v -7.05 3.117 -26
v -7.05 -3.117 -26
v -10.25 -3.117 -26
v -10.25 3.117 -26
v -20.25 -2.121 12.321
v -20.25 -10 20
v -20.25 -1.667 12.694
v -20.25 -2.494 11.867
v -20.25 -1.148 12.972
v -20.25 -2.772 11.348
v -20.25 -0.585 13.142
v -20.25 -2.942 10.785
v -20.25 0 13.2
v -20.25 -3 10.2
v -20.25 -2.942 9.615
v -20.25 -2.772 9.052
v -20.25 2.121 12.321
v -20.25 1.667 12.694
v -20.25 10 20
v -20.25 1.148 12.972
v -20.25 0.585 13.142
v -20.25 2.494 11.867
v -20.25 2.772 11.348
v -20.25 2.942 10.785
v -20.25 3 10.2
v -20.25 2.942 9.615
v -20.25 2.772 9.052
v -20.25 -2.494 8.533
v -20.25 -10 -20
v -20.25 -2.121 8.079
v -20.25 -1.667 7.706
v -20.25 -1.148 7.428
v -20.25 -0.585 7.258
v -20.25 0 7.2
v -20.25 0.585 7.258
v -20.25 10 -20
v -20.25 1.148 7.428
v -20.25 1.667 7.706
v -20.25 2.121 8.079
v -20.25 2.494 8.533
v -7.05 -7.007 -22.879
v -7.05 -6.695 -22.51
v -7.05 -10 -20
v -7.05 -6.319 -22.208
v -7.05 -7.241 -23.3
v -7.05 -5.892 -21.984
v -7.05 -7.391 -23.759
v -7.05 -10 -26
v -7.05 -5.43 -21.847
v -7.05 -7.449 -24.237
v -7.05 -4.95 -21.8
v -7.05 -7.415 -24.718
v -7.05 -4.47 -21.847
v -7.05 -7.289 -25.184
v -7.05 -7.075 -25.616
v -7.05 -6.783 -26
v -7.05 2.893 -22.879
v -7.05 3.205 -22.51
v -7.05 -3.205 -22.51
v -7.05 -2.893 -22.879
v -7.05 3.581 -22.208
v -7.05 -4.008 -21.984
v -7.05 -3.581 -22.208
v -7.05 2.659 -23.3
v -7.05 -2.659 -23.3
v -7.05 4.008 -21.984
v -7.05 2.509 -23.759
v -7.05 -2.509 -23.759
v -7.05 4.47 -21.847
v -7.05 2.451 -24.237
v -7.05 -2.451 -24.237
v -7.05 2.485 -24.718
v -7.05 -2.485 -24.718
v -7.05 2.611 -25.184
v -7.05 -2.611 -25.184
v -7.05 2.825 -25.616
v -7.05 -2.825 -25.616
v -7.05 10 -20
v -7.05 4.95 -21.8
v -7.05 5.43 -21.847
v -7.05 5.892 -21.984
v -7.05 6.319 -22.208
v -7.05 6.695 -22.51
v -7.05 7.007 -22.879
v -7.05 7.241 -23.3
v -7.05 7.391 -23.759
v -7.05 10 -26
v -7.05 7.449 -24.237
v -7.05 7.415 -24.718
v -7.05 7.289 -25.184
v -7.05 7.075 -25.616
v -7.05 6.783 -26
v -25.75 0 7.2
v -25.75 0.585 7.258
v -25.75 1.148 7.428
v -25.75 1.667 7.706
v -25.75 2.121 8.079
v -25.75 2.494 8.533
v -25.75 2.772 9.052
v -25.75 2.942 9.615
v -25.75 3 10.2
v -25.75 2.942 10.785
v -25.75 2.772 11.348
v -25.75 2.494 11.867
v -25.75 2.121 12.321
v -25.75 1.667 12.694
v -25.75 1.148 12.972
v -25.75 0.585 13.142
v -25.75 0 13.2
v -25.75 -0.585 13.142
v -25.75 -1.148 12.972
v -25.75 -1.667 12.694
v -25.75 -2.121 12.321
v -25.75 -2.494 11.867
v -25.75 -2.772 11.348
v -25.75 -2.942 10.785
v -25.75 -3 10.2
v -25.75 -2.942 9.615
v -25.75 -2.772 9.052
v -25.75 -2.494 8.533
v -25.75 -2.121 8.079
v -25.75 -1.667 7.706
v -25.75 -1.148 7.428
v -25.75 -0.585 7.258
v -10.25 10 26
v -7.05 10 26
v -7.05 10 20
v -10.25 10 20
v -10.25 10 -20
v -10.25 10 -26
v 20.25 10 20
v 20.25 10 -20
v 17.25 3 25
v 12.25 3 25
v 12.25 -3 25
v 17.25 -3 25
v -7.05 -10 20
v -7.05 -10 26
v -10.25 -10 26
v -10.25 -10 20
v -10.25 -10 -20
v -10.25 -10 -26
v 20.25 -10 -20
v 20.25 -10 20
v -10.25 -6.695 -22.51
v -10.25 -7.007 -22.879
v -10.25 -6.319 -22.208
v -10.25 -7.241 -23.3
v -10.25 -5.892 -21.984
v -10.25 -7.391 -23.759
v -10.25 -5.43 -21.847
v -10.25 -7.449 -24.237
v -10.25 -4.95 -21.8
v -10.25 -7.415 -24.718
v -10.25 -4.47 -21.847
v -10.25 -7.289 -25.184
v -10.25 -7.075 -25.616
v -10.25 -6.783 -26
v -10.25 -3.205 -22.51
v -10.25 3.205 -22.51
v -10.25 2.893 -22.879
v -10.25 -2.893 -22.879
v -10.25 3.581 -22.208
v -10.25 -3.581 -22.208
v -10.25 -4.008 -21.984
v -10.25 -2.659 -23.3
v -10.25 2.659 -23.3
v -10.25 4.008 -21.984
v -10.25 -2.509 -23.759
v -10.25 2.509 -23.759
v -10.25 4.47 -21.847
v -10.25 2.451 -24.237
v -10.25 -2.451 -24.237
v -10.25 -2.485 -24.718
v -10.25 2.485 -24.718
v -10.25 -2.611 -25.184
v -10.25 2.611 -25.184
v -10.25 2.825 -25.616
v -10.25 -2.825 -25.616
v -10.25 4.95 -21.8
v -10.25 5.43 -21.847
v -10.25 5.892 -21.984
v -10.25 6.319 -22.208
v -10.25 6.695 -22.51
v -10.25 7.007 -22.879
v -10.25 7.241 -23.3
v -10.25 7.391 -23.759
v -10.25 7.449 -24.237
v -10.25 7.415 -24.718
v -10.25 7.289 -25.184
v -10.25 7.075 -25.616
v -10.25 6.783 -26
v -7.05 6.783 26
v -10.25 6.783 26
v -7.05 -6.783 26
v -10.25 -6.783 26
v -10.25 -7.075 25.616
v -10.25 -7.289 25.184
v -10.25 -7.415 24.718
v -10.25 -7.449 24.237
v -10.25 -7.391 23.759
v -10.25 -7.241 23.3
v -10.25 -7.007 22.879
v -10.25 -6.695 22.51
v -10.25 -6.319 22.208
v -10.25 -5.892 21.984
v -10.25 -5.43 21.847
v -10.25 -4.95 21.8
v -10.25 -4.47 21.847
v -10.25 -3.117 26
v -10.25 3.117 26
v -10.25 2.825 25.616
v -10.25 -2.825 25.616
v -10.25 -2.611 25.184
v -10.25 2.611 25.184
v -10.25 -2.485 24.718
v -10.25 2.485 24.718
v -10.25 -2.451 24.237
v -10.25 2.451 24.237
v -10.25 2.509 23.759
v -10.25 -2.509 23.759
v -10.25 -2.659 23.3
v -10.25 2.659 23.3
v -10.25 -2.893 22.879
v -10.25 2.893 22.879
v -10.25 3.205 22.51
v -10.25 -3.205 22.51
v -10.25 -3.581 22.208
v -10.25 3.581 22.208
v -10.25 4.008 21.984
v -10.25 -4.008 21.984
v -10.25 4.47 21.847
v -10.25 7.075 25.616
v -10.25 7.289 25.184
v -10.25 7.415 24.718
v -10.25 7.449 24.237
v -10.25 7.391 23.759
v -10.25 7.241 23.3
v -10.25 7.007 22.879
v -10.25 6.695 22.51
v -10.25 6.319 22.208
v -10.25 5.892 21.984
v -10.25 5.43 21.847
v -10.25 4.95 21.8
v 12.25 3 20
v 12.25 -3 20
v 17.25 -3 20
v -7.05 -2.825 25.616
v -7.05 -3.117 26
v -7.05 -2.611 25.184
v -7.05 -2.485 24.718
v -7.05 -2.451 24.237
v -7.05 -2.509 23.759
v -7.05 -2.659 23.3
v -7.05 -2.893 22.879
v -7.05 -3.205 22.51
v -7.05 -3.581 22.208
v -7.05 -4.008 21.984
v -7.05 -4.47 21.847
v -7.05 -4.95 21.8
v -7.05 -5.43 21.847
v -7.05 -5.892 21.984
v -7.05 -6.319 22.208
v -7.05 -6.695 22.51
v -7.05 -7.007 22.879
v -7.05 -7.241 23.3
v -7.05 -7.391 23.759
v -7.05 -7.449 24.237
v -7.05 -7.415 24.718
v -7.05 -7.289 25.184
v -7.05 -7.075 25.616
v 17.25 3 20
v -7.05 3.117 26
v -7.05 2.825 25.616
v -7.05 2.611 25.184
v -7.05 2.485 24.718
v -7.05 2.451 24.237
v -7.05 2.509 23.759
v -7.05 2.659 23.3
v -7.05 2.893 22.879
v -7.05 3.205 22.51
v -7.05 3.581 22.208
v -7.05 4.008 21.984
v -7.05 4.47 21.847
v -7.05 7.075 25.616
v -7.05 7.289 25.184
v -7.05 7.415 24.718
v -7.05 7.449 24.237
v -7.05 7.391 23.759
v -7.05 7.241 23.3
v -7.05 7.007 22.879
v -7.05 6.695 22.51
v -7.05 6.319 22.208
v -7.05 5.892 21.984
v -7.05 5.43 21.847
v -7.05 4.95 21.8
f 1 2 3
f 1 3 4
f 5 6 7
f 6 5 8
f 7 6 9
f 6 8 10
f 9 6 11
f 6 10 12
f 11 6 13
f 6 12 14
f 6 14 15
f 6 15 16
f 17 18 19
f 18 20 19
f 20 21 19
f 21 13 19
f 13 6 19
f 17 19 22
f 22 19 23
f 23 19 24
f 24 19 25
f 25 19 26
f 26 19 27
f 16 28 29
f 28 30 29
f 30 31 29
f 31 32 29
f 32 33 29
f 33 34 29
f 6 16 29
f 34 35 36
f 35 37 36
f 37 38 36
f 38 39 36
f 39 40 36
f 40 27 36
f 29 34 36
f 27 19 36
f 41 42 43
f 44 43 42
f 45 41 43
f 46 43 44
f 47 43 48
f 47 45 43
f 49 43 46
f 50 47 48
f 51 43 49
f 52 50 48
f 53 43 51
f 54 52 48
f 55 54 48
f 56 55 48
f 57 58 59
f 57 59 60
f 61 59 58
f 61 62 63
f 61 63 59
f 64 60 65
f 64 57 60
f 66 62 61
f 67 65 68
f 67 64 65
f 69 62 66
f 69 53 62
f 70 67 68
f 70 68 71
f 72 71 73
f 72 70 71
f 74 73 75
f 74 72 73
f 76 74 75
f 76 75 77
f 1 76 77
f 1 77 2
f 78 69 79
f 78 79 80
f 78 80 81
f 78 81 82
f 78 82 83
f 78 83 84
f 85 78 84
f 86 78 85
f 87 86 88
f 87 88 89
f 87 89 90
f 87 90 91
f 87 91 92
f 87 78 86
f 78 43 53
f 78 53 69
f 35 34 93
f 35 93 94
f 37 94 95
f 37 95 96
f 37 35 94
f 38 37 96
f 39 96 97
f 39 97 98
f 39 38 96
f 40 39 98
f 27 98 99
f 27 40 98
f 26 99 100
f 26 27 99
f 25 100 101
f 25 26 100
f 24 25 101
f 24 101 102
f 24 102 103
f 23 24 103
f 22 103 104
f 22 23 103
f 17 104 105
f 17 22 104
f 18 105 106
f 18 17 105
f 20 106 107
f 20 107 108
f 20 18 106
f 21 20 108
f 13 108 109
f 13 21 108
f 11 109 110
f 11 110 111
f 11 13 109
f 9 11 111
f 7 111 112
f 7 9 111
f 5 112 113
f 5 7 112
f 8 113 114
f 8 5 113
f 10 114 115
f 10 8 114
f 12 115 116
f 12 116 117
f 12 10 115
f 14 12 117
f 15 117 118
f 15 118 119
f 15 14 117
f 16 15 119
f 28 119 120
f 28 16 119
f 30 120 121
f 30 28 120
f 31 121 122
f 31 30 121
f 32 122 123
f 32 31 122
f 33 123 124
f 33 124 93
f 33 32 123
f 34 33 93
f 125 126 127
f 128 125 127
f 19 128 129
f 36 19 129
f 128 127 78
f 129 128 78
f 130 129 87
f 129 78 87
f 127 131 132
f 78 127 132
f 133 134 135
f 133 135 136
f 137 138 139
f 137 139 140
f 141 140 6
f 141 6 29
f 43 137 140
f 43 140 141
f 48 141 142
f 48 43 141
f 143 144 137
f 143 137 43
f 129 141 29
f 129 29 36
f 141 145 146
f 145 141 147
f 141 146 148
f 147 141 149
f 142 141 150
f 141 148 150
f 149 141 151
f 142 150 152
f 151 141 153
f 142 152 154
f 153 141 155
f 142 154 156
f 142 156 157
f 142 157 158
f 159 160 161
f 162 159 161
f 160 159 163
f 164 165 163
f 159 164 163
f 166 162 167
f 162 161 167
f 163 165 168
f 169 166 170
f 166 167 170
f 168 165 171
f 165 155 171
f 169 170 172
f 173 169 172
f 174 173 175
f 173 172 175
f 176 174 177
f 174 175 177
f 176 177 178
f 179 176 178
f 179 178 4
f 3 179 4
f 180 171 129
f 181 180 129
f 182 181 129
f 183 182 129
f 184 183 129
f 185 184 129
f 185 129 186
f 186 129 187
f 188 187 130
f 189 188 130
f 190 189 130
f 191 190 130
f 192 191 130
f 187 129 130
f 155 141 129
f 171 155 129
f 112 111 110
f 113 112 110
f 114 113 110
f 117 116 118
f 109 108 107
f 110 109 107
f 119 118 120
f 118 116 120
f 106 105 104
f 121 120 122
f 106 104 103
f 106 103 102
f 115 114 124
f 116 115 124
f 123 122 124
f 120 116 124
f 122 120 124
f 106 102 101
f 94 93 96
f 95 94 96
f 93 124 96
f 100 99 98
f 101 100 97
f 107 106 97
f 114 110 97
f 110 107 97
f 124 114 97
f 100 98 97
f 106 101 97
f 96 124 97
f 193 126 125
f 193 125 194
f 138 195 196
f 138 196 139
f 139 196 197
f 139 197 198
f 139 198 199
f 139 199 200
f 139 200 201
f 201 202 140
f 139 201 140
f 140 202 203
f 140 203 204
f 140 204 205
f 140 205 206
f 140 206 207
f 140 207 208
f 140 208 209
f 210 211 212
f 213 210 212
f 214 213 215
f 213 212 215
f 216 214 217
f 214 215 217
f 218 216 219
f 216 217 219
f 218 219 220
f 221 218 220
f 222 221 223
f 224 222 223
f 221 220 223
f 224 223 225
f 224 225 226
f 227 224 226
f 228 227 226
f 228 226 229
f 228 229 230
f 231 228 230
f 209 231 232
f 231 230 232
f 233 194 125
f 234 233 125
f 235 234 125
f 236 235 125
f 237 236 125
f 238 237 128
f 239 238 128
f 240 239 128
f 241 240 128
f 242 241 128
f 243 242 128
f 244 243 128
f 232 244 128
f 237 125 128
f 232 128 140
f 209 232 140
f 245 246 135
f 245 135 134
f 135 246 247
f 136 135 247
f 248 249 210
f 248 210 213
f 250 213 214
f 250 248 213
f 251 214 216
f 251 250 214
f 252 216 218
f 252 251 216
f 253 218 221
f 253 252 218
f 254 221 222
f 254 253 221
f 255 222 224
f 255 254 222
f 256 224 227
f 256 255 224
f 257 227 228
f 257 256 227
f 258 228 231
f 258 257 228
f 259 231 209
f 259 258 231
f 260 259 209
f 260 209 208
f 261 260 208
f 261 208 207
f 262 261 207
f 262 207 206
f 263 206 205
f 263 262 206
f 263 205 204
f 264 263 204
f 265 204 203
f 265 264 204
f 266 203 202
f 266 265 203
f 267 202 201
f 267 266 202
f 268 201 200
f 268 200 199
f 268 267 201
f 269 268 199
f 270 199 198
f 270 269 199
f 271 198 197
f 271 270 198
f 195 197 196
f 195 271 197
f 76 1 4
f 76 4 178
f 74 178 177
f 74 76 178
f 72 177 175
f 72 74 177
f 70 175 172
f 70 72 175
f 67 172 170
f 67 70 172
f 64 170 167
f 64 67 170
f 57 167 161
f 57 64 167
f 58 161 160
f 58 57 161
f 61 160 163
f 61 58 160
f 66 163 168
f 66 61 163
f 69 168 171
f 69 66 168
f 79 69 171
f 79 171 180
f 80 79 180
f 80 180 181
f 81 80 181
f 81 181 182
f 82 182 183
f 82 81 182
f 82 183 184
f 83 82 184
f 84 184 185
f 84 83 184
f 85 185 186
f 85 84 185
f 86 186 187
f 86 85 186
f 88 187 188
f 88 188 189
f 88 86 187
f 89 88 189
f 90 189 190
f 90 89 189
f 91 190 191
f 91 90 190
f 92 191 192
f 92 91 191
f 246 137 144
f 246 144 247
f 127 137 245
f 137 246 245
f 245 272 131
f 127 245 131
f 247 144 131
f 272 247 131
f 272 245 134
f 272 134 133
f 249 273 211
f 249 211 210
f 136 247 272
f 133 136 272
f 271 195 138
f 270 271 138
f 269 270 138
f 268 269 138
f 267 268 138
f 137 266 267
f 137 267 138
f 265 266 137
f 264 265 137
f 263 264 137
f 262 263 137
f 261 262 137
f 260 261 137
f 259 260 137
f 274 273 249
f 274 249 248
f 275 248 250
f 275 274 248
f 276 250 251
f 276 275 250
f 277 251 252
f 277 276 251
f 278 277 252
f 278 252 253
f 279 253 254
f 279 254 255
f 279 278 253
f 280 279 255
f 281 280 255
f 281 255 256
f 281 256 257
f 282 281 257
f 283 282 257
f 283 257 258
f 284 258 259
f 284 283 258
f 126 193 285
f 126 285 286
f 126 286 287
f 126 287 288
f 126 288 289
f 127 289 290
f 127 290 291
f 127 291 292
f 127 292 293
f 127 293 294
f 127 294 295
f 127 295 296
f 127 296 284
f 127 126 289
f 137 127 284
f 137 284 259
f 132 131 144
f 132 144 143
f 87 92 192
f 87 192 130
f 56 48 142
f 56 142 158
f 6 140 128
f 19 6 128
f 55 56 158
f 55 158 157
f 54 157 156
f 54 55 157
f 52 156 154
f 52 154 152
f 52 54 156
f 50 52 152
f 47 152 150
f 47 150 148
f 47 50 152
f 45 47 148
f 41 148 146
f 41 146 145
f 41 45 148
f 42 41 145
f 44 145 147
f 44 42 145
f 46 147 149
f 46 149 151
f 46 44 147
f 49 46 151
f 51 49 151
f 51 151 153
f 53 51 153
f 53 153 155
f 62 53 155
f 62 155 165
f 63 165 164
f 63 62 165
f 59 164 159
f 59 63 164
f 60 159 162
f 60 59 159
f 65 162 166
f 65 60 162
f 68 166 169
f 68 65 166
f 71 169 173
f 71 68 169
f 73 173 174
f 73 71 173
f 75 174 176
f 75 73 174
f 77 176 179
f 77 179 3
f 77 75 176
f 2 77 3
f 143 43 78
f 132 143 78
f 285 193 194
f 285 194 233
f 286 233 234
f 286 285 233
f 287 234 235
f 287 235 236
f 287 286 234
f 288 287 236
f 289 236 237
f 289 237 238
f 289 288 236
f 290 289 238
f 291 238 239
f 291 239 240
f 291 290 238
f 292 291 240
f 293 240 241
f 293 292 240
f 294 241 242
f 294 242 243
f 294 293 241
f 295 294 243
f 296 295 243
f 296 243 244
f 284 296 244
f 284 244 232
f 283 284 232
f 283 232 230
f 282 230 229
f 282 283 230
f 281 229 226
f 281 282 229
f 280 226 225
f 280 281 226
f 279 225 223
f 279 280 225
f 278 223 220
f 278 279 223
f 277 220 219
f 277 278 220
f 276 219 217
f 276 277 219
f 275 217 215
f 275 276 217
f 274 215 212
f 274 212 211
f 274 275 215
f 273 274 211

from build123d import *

# Parameters (mm, degrees)
BOSS_EXTRUDE1_START = 20.25
SKETCH2_W           = 40
SKETCH2_H           = 20
SKETCH2_R           = 3
BOSS_EXTRUDE1_DEPTH = 40.5
BOSS_EXTRUDE2_START = -7.05
BOSS_EXTRUDE2_DEPTH = 3.2
BOSS_EXTRUDE3_START = -20.25
SKETCH2_5_R         = 3
BOSS_EXTRUDE3_DEPTH = 5.5
SKETCH3_W           = 5
SKETCH3_H           = 6
BOSS_EXTRUDE4_DEPTH = 5


with BuildPart() as part:
    # Sketch2 → Boss-Extrude1 (new body)
    # profile 1 of 2: a face of its own
    with BuildSketch(Plane(origin=(0, 0, 0), x_dir=(0, 0, -1), z_dir=(1, 0, 0)).offset(BOSS_EXTRUDE1_START)):
        Rectangle(SKETCH2_W, SKETCH2_H)
        with Locations((-10.2, 0)):
            Circle(SKETCH2_R, mode=Mode.SUBTRACT)
    # profile 2 of 2: a face of its own
    with BuildSketch(Plane(origin=(0, 0, 0), x_dir=(0, 0, -1), z_dir=(1, 0, 0)).offset(BOSS_EXTRUDE1_START)):
        with Locations((-10.2, 0)):
            Circle(SKETCH2_R)
    extrude(amount=-BOSS_EXTRUDE1_DEPTH)

    # Sketch2<3> → Boss-Extrude2 (add)
    with BuildSketch(Plane(origin=(0, 0, 0), x_dir=(0, 0, -1), z_dir=(1, 0, 0)).offset(BOSS_EXTRUDE2_START)):
        with BuildLine():
            Line((-26, -10), (-20, -10))
            Line((-20, -10), (-20, 10))
            Line((-20, 10), (-26, 10))
            Line((-26, 10), (-26, 6.783030278))
            ThreePointArc((-26, 6.783030278), (-21.8, 4.95), (-26, 3.116969722))
            Line((-26, 3.116969722), (-26, -3.116969722))
            ThreePointArc((-26, -3.116969722), (-21.8, -4.95), (-26, -6.783030278))
            Line((-26, -6.783030278), (-26, -10))
        make_face()
        with BuildLine():
            Line((20, 10), (20, -10))
            Line((20, -10), (26, -10))
            Line((26, -10), (26, -6.783030278))
            ThreePointArc((26, -6.783030278), (21.8, -4.95), (26, -3.116969722))
            Line((26, -3.116969722), (26, 3.116969722))
            ThreePointArc((26, 3.116969722), (21.8, 4.95), (26, 6.783030278))
            Line((26, 6.783030278), (26, 10))
            Line((26, 10), (20, 10))
        make_face()
    extrude(amount=-BOSS_EXTRUDE2_DEPTH)

    # Sketch2<5> → Boss-Extrude3 (add)
    with BuildSketch(Plane(origin=(0, 0, 0), x_dir=(0, 0, -1), z_dir=(1, 0, 0)).offset(BOSS_EXTRUDE3_START)):
        with Locations((-10.2, 0)):
            Circle(SKETCH2_5_R)
    extrude(amount=-BOSS_EXTRUDE3_DEPTH)

    # Sketch3 → Boss-Extrude4 (add)
    with BuildSketch(Plane.XY.offset(20)):
        with Locations((14.75, 0)):
            Rectangle(SKETCH3_W, SKETCH3_H)
    extrude(amount=BOSS_EXTRUDE4_DEPTH)


solid = part.part
